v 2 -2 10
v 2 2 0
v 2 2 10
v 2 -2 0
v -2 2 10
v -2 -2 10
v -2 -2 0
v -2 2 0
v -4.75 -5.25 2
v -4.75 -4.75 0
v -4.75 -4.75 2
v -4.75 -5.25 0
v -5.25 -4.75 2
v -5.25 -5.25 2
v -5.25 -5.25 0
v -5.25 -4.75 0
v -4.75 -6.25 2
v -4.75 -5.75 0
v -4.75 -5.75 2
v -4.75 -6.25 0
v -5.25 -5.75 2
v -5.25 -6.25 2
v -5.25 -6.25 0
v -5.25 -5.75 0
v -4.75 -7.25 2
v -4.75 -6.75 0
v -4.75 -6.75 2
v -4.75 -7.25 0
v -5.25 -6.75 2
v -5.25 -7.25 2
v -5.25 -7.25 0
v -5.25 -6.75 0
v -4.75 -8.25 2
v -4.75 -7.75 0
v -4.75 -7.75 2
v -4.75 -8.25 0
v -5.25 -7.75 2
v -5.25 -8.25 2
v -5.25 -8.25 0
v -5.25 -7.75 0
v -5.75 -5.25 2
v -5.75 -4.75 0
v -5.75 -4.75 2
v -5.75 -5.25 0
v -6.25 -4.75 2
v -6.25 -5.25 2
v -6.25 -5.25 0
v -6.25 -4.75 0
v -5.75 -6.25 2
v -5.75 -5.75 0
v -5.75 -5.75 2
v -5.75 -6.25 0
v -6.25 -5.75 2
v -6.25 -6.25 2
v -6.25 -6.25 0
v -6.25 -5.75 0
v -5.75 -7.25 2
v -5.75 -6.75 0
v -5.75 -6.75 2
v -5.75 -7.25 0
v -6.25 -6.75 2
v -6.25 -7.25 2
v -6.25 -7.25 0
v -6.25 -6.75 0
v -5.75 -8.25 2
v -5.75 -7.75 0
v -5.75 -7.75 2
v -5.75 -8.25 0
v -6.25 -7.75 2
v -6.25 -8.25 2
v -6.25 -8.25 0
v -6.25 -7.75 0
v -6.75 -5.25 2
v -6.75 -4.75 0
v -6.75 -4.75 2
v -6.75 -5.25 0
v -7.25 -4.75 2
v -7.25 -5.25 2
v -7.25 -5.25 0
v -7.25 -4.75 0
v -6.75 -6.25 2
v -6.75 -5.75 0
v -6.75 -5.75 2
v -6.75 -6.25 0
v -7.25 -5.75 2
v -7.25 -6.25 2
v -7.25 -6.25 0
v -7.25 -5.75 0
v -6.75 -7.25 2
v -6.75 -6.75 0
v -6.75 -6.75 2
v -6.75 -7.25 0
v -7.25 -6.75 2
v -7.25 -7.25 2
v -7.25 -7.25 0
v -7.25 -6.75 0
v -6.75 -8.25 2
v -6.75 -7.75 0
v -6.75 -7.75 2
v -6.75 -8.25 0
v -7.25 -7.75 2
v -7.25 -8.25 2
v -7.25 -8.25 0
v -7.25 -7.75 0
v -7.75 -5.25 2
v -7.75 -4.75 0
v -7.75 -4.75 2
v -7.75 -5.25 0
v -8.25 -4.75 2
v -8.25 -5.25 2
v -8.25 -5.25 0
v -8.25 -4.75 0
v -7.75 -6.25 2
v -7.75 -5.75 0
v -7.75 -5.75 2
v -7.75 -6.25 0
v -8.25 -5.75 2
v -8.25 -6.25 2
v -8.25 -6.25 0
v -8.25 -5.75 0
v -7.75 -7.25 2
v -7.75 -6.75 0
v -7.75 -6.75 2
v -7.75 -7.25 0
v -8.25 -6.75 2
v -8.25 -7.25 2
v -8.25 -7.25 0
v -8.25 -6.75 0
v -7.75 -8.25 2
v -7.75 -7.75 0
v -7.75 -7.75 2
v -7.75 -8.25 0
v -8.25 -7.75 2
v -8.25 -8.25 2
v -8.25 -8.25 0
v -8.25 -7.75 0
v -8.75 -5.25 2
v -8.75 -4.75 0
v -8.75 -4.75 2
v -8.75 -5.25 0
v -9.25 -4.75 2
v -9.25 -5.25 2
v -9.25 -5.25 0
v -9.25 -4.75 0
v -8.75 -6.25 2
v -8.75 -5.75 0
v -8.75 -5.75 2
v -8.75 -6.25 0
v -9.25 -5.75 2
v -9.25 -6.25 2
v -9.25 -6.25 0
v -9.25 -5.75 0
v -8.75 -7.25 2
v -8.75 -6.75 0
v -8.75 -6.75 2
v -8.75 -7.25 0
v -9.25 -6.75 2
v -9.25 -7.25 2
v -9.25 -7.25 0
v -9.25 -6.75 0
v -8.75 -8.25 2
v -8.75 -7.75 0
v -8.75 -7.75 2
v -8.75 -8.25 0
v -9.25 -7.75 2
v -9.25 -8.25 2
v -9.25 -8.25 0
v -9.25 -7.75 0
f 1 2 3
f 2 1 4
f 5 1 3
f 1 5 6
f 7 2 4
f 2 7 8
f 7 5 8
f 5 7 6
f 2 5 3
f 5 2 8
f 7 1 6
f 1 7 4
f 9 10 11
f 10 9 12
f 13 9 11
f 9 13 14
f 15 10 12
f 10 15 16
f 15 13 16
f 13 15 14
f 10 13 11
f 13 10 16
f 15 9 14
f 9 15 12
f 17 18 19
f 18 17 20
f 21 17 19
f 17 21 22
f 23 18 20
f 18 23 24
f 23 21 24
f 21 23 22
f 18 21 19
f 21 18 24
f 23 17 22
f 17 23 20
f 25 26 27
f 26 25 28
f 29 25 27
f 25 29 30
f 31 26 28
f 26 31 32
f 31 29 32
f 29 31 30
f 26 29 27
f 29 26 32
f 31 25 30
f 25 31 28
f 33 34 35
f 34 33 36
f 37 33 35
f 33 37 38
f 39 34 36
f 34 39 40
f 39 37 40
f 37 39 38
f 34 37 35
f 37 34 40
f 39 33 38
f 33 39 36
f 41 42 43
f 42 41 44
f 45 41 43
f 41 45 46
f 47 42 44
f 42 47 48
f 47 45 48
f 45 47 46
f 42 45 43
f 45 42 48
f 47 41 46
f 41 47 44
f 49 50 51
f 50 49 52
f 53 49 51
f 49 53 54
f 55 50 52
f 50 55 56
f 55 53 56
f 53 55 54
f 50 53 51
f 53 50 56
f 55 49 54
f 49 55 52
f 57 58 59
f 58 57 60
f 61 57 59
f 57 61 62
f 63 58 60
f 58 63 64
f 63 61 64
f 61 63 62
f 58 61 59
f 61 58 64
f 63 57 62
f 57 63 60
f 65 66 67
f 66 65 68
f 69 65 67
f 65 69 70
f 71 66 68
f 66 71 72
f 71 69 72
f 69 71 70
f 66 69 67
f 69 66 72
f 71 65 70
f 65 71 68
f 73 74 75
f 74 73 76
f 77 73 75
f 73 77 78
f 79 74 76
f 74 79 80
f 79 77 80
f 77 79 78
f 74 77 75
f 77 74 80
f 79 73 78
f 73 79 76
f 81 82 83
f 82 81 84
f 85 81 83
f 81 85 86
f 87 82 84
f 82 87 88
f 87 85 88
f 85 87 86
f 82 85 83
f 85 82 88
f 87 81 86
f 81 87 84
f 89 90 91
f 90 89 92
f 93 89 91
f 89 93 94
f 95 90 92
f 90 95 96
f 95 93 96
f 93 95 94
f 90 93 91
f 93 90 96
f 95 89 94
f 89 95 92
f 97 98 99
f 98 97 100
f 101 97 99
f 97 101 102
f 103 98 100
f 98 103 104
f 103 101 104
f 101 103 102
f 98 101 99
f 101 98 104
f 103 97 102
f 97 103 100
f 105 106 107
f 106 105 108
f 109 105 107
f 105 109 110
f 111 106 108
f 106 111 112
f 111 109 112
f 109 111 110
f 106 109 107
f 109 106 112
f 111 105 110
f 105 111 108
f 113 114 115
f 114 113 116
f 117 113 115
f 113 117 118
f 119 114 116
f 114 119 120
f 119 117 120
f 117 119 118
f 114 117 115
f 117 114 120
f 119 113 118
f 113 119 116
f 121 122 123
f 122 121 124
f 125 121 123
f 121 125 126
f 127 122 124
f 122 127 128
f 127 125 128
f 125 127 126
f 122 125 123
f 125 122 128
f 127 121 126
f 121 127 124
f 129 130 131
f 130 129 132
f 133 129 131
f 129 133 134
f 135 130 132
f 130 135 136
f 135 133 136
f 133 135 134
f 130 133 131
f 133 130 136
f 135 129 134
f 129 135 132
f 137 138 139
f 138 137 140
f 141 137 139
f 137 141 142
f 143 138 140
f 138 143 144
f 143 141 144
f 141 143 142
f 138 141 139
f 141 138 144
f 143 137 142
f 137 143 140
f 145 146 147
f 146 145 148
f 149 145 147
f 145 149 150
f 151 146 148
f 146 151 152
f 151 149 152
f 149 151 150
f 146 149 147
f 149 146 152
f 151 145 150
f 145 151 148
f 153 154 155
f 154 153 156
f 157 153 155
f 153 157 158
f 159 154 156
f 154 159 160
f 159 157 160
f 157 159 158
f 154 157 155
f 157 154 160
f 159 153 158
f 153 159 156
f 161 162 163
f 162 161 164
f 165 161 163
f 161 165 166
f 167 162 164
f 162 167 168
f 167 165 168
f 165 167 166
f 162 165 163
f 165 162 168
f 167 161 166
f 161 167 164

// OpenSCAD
translate([0, 0, 5]) color([0,1,0,0.9]) cube([4, 4, 10], center=true);
translate([-5.0, -5.0, 1]) color([1,0,0]) cube([0.5, 0.5, 2], center=true);
translate([-5.0, -6.0, 1]) color([1,0,0]) cube([0.5, 0.5, 2], center=true);
translate([-5.0, -7.0, 1]) color([1,0,0]) cube([0.5, 0.5, 2], center=true);
translate([-5.0, -8.0, 1]) color([1,0,0]) cube([0.5, 0.5, 2], center=true);
translate([-6.0, -5.0, 1]) color([1,0,0]) cube([0.5, 0.5, 2], center=true);
translate([-6.0, -6.0, 1]) color([1,0,0]) cube([0.5, 0.5, 2], center=true);
translate([-6.0, -7.0, 1]) color([1,0,0]) cube([0.5, 0.5, 2], center=true);
translate([-6.0, -8.0, 1]) color([1,0,0]) cube([0.5, 0.5, 2], center=true);
translate([-7.0, -5.0, 1]) color([1,0,0]) cube([0.5, 0.5, 2], center=true);
translate([-7.0, -6.0, 1]) color([1,0,0]) cube([0.5, 0.5, 2], center=true);
translate([-7.0, -7.0, 1]) color([1,0,0]) cube([0.5, 0.5, 2], center=true);
translate([-7.0, -8.0, 1]) color([1,0,0]) cube([0.5, 0.5, 2], center=true);
translate([-8.0, -5.0, 1]) color([1,0,0]) cube([0.5, 0.5, 2], center=true);
translate([-8.0, -6.0, 1]) color([1,0,0]) cube([0.5, 0.5, 2], center=true);
translate([-8.0, -7.0, 1]) color([1,0,0]) cube([0.5, 0.5, 2], center=true);
translate([-8.0, -8.0, 1]) color([1,0,0]) cube([0.5, 0.5, 2], center=true);
translate([-9.0, -5.0, 1]) color([1,0,0]) cube([0.5, 0.5, 2], center=true);
translate([-9.0, -6.0, 1]) color([1,0,0]) cube([0.5, 0.5, 2], center=true);
translate([-9.0, -7.0, 1]) color([1,0,0]) cube([0.5, 0.5, 2], center=true);
translate([-9.0, -8.0, 1]) color([1,0,0]) cube([0.5, 0.5, 2], center=true);
